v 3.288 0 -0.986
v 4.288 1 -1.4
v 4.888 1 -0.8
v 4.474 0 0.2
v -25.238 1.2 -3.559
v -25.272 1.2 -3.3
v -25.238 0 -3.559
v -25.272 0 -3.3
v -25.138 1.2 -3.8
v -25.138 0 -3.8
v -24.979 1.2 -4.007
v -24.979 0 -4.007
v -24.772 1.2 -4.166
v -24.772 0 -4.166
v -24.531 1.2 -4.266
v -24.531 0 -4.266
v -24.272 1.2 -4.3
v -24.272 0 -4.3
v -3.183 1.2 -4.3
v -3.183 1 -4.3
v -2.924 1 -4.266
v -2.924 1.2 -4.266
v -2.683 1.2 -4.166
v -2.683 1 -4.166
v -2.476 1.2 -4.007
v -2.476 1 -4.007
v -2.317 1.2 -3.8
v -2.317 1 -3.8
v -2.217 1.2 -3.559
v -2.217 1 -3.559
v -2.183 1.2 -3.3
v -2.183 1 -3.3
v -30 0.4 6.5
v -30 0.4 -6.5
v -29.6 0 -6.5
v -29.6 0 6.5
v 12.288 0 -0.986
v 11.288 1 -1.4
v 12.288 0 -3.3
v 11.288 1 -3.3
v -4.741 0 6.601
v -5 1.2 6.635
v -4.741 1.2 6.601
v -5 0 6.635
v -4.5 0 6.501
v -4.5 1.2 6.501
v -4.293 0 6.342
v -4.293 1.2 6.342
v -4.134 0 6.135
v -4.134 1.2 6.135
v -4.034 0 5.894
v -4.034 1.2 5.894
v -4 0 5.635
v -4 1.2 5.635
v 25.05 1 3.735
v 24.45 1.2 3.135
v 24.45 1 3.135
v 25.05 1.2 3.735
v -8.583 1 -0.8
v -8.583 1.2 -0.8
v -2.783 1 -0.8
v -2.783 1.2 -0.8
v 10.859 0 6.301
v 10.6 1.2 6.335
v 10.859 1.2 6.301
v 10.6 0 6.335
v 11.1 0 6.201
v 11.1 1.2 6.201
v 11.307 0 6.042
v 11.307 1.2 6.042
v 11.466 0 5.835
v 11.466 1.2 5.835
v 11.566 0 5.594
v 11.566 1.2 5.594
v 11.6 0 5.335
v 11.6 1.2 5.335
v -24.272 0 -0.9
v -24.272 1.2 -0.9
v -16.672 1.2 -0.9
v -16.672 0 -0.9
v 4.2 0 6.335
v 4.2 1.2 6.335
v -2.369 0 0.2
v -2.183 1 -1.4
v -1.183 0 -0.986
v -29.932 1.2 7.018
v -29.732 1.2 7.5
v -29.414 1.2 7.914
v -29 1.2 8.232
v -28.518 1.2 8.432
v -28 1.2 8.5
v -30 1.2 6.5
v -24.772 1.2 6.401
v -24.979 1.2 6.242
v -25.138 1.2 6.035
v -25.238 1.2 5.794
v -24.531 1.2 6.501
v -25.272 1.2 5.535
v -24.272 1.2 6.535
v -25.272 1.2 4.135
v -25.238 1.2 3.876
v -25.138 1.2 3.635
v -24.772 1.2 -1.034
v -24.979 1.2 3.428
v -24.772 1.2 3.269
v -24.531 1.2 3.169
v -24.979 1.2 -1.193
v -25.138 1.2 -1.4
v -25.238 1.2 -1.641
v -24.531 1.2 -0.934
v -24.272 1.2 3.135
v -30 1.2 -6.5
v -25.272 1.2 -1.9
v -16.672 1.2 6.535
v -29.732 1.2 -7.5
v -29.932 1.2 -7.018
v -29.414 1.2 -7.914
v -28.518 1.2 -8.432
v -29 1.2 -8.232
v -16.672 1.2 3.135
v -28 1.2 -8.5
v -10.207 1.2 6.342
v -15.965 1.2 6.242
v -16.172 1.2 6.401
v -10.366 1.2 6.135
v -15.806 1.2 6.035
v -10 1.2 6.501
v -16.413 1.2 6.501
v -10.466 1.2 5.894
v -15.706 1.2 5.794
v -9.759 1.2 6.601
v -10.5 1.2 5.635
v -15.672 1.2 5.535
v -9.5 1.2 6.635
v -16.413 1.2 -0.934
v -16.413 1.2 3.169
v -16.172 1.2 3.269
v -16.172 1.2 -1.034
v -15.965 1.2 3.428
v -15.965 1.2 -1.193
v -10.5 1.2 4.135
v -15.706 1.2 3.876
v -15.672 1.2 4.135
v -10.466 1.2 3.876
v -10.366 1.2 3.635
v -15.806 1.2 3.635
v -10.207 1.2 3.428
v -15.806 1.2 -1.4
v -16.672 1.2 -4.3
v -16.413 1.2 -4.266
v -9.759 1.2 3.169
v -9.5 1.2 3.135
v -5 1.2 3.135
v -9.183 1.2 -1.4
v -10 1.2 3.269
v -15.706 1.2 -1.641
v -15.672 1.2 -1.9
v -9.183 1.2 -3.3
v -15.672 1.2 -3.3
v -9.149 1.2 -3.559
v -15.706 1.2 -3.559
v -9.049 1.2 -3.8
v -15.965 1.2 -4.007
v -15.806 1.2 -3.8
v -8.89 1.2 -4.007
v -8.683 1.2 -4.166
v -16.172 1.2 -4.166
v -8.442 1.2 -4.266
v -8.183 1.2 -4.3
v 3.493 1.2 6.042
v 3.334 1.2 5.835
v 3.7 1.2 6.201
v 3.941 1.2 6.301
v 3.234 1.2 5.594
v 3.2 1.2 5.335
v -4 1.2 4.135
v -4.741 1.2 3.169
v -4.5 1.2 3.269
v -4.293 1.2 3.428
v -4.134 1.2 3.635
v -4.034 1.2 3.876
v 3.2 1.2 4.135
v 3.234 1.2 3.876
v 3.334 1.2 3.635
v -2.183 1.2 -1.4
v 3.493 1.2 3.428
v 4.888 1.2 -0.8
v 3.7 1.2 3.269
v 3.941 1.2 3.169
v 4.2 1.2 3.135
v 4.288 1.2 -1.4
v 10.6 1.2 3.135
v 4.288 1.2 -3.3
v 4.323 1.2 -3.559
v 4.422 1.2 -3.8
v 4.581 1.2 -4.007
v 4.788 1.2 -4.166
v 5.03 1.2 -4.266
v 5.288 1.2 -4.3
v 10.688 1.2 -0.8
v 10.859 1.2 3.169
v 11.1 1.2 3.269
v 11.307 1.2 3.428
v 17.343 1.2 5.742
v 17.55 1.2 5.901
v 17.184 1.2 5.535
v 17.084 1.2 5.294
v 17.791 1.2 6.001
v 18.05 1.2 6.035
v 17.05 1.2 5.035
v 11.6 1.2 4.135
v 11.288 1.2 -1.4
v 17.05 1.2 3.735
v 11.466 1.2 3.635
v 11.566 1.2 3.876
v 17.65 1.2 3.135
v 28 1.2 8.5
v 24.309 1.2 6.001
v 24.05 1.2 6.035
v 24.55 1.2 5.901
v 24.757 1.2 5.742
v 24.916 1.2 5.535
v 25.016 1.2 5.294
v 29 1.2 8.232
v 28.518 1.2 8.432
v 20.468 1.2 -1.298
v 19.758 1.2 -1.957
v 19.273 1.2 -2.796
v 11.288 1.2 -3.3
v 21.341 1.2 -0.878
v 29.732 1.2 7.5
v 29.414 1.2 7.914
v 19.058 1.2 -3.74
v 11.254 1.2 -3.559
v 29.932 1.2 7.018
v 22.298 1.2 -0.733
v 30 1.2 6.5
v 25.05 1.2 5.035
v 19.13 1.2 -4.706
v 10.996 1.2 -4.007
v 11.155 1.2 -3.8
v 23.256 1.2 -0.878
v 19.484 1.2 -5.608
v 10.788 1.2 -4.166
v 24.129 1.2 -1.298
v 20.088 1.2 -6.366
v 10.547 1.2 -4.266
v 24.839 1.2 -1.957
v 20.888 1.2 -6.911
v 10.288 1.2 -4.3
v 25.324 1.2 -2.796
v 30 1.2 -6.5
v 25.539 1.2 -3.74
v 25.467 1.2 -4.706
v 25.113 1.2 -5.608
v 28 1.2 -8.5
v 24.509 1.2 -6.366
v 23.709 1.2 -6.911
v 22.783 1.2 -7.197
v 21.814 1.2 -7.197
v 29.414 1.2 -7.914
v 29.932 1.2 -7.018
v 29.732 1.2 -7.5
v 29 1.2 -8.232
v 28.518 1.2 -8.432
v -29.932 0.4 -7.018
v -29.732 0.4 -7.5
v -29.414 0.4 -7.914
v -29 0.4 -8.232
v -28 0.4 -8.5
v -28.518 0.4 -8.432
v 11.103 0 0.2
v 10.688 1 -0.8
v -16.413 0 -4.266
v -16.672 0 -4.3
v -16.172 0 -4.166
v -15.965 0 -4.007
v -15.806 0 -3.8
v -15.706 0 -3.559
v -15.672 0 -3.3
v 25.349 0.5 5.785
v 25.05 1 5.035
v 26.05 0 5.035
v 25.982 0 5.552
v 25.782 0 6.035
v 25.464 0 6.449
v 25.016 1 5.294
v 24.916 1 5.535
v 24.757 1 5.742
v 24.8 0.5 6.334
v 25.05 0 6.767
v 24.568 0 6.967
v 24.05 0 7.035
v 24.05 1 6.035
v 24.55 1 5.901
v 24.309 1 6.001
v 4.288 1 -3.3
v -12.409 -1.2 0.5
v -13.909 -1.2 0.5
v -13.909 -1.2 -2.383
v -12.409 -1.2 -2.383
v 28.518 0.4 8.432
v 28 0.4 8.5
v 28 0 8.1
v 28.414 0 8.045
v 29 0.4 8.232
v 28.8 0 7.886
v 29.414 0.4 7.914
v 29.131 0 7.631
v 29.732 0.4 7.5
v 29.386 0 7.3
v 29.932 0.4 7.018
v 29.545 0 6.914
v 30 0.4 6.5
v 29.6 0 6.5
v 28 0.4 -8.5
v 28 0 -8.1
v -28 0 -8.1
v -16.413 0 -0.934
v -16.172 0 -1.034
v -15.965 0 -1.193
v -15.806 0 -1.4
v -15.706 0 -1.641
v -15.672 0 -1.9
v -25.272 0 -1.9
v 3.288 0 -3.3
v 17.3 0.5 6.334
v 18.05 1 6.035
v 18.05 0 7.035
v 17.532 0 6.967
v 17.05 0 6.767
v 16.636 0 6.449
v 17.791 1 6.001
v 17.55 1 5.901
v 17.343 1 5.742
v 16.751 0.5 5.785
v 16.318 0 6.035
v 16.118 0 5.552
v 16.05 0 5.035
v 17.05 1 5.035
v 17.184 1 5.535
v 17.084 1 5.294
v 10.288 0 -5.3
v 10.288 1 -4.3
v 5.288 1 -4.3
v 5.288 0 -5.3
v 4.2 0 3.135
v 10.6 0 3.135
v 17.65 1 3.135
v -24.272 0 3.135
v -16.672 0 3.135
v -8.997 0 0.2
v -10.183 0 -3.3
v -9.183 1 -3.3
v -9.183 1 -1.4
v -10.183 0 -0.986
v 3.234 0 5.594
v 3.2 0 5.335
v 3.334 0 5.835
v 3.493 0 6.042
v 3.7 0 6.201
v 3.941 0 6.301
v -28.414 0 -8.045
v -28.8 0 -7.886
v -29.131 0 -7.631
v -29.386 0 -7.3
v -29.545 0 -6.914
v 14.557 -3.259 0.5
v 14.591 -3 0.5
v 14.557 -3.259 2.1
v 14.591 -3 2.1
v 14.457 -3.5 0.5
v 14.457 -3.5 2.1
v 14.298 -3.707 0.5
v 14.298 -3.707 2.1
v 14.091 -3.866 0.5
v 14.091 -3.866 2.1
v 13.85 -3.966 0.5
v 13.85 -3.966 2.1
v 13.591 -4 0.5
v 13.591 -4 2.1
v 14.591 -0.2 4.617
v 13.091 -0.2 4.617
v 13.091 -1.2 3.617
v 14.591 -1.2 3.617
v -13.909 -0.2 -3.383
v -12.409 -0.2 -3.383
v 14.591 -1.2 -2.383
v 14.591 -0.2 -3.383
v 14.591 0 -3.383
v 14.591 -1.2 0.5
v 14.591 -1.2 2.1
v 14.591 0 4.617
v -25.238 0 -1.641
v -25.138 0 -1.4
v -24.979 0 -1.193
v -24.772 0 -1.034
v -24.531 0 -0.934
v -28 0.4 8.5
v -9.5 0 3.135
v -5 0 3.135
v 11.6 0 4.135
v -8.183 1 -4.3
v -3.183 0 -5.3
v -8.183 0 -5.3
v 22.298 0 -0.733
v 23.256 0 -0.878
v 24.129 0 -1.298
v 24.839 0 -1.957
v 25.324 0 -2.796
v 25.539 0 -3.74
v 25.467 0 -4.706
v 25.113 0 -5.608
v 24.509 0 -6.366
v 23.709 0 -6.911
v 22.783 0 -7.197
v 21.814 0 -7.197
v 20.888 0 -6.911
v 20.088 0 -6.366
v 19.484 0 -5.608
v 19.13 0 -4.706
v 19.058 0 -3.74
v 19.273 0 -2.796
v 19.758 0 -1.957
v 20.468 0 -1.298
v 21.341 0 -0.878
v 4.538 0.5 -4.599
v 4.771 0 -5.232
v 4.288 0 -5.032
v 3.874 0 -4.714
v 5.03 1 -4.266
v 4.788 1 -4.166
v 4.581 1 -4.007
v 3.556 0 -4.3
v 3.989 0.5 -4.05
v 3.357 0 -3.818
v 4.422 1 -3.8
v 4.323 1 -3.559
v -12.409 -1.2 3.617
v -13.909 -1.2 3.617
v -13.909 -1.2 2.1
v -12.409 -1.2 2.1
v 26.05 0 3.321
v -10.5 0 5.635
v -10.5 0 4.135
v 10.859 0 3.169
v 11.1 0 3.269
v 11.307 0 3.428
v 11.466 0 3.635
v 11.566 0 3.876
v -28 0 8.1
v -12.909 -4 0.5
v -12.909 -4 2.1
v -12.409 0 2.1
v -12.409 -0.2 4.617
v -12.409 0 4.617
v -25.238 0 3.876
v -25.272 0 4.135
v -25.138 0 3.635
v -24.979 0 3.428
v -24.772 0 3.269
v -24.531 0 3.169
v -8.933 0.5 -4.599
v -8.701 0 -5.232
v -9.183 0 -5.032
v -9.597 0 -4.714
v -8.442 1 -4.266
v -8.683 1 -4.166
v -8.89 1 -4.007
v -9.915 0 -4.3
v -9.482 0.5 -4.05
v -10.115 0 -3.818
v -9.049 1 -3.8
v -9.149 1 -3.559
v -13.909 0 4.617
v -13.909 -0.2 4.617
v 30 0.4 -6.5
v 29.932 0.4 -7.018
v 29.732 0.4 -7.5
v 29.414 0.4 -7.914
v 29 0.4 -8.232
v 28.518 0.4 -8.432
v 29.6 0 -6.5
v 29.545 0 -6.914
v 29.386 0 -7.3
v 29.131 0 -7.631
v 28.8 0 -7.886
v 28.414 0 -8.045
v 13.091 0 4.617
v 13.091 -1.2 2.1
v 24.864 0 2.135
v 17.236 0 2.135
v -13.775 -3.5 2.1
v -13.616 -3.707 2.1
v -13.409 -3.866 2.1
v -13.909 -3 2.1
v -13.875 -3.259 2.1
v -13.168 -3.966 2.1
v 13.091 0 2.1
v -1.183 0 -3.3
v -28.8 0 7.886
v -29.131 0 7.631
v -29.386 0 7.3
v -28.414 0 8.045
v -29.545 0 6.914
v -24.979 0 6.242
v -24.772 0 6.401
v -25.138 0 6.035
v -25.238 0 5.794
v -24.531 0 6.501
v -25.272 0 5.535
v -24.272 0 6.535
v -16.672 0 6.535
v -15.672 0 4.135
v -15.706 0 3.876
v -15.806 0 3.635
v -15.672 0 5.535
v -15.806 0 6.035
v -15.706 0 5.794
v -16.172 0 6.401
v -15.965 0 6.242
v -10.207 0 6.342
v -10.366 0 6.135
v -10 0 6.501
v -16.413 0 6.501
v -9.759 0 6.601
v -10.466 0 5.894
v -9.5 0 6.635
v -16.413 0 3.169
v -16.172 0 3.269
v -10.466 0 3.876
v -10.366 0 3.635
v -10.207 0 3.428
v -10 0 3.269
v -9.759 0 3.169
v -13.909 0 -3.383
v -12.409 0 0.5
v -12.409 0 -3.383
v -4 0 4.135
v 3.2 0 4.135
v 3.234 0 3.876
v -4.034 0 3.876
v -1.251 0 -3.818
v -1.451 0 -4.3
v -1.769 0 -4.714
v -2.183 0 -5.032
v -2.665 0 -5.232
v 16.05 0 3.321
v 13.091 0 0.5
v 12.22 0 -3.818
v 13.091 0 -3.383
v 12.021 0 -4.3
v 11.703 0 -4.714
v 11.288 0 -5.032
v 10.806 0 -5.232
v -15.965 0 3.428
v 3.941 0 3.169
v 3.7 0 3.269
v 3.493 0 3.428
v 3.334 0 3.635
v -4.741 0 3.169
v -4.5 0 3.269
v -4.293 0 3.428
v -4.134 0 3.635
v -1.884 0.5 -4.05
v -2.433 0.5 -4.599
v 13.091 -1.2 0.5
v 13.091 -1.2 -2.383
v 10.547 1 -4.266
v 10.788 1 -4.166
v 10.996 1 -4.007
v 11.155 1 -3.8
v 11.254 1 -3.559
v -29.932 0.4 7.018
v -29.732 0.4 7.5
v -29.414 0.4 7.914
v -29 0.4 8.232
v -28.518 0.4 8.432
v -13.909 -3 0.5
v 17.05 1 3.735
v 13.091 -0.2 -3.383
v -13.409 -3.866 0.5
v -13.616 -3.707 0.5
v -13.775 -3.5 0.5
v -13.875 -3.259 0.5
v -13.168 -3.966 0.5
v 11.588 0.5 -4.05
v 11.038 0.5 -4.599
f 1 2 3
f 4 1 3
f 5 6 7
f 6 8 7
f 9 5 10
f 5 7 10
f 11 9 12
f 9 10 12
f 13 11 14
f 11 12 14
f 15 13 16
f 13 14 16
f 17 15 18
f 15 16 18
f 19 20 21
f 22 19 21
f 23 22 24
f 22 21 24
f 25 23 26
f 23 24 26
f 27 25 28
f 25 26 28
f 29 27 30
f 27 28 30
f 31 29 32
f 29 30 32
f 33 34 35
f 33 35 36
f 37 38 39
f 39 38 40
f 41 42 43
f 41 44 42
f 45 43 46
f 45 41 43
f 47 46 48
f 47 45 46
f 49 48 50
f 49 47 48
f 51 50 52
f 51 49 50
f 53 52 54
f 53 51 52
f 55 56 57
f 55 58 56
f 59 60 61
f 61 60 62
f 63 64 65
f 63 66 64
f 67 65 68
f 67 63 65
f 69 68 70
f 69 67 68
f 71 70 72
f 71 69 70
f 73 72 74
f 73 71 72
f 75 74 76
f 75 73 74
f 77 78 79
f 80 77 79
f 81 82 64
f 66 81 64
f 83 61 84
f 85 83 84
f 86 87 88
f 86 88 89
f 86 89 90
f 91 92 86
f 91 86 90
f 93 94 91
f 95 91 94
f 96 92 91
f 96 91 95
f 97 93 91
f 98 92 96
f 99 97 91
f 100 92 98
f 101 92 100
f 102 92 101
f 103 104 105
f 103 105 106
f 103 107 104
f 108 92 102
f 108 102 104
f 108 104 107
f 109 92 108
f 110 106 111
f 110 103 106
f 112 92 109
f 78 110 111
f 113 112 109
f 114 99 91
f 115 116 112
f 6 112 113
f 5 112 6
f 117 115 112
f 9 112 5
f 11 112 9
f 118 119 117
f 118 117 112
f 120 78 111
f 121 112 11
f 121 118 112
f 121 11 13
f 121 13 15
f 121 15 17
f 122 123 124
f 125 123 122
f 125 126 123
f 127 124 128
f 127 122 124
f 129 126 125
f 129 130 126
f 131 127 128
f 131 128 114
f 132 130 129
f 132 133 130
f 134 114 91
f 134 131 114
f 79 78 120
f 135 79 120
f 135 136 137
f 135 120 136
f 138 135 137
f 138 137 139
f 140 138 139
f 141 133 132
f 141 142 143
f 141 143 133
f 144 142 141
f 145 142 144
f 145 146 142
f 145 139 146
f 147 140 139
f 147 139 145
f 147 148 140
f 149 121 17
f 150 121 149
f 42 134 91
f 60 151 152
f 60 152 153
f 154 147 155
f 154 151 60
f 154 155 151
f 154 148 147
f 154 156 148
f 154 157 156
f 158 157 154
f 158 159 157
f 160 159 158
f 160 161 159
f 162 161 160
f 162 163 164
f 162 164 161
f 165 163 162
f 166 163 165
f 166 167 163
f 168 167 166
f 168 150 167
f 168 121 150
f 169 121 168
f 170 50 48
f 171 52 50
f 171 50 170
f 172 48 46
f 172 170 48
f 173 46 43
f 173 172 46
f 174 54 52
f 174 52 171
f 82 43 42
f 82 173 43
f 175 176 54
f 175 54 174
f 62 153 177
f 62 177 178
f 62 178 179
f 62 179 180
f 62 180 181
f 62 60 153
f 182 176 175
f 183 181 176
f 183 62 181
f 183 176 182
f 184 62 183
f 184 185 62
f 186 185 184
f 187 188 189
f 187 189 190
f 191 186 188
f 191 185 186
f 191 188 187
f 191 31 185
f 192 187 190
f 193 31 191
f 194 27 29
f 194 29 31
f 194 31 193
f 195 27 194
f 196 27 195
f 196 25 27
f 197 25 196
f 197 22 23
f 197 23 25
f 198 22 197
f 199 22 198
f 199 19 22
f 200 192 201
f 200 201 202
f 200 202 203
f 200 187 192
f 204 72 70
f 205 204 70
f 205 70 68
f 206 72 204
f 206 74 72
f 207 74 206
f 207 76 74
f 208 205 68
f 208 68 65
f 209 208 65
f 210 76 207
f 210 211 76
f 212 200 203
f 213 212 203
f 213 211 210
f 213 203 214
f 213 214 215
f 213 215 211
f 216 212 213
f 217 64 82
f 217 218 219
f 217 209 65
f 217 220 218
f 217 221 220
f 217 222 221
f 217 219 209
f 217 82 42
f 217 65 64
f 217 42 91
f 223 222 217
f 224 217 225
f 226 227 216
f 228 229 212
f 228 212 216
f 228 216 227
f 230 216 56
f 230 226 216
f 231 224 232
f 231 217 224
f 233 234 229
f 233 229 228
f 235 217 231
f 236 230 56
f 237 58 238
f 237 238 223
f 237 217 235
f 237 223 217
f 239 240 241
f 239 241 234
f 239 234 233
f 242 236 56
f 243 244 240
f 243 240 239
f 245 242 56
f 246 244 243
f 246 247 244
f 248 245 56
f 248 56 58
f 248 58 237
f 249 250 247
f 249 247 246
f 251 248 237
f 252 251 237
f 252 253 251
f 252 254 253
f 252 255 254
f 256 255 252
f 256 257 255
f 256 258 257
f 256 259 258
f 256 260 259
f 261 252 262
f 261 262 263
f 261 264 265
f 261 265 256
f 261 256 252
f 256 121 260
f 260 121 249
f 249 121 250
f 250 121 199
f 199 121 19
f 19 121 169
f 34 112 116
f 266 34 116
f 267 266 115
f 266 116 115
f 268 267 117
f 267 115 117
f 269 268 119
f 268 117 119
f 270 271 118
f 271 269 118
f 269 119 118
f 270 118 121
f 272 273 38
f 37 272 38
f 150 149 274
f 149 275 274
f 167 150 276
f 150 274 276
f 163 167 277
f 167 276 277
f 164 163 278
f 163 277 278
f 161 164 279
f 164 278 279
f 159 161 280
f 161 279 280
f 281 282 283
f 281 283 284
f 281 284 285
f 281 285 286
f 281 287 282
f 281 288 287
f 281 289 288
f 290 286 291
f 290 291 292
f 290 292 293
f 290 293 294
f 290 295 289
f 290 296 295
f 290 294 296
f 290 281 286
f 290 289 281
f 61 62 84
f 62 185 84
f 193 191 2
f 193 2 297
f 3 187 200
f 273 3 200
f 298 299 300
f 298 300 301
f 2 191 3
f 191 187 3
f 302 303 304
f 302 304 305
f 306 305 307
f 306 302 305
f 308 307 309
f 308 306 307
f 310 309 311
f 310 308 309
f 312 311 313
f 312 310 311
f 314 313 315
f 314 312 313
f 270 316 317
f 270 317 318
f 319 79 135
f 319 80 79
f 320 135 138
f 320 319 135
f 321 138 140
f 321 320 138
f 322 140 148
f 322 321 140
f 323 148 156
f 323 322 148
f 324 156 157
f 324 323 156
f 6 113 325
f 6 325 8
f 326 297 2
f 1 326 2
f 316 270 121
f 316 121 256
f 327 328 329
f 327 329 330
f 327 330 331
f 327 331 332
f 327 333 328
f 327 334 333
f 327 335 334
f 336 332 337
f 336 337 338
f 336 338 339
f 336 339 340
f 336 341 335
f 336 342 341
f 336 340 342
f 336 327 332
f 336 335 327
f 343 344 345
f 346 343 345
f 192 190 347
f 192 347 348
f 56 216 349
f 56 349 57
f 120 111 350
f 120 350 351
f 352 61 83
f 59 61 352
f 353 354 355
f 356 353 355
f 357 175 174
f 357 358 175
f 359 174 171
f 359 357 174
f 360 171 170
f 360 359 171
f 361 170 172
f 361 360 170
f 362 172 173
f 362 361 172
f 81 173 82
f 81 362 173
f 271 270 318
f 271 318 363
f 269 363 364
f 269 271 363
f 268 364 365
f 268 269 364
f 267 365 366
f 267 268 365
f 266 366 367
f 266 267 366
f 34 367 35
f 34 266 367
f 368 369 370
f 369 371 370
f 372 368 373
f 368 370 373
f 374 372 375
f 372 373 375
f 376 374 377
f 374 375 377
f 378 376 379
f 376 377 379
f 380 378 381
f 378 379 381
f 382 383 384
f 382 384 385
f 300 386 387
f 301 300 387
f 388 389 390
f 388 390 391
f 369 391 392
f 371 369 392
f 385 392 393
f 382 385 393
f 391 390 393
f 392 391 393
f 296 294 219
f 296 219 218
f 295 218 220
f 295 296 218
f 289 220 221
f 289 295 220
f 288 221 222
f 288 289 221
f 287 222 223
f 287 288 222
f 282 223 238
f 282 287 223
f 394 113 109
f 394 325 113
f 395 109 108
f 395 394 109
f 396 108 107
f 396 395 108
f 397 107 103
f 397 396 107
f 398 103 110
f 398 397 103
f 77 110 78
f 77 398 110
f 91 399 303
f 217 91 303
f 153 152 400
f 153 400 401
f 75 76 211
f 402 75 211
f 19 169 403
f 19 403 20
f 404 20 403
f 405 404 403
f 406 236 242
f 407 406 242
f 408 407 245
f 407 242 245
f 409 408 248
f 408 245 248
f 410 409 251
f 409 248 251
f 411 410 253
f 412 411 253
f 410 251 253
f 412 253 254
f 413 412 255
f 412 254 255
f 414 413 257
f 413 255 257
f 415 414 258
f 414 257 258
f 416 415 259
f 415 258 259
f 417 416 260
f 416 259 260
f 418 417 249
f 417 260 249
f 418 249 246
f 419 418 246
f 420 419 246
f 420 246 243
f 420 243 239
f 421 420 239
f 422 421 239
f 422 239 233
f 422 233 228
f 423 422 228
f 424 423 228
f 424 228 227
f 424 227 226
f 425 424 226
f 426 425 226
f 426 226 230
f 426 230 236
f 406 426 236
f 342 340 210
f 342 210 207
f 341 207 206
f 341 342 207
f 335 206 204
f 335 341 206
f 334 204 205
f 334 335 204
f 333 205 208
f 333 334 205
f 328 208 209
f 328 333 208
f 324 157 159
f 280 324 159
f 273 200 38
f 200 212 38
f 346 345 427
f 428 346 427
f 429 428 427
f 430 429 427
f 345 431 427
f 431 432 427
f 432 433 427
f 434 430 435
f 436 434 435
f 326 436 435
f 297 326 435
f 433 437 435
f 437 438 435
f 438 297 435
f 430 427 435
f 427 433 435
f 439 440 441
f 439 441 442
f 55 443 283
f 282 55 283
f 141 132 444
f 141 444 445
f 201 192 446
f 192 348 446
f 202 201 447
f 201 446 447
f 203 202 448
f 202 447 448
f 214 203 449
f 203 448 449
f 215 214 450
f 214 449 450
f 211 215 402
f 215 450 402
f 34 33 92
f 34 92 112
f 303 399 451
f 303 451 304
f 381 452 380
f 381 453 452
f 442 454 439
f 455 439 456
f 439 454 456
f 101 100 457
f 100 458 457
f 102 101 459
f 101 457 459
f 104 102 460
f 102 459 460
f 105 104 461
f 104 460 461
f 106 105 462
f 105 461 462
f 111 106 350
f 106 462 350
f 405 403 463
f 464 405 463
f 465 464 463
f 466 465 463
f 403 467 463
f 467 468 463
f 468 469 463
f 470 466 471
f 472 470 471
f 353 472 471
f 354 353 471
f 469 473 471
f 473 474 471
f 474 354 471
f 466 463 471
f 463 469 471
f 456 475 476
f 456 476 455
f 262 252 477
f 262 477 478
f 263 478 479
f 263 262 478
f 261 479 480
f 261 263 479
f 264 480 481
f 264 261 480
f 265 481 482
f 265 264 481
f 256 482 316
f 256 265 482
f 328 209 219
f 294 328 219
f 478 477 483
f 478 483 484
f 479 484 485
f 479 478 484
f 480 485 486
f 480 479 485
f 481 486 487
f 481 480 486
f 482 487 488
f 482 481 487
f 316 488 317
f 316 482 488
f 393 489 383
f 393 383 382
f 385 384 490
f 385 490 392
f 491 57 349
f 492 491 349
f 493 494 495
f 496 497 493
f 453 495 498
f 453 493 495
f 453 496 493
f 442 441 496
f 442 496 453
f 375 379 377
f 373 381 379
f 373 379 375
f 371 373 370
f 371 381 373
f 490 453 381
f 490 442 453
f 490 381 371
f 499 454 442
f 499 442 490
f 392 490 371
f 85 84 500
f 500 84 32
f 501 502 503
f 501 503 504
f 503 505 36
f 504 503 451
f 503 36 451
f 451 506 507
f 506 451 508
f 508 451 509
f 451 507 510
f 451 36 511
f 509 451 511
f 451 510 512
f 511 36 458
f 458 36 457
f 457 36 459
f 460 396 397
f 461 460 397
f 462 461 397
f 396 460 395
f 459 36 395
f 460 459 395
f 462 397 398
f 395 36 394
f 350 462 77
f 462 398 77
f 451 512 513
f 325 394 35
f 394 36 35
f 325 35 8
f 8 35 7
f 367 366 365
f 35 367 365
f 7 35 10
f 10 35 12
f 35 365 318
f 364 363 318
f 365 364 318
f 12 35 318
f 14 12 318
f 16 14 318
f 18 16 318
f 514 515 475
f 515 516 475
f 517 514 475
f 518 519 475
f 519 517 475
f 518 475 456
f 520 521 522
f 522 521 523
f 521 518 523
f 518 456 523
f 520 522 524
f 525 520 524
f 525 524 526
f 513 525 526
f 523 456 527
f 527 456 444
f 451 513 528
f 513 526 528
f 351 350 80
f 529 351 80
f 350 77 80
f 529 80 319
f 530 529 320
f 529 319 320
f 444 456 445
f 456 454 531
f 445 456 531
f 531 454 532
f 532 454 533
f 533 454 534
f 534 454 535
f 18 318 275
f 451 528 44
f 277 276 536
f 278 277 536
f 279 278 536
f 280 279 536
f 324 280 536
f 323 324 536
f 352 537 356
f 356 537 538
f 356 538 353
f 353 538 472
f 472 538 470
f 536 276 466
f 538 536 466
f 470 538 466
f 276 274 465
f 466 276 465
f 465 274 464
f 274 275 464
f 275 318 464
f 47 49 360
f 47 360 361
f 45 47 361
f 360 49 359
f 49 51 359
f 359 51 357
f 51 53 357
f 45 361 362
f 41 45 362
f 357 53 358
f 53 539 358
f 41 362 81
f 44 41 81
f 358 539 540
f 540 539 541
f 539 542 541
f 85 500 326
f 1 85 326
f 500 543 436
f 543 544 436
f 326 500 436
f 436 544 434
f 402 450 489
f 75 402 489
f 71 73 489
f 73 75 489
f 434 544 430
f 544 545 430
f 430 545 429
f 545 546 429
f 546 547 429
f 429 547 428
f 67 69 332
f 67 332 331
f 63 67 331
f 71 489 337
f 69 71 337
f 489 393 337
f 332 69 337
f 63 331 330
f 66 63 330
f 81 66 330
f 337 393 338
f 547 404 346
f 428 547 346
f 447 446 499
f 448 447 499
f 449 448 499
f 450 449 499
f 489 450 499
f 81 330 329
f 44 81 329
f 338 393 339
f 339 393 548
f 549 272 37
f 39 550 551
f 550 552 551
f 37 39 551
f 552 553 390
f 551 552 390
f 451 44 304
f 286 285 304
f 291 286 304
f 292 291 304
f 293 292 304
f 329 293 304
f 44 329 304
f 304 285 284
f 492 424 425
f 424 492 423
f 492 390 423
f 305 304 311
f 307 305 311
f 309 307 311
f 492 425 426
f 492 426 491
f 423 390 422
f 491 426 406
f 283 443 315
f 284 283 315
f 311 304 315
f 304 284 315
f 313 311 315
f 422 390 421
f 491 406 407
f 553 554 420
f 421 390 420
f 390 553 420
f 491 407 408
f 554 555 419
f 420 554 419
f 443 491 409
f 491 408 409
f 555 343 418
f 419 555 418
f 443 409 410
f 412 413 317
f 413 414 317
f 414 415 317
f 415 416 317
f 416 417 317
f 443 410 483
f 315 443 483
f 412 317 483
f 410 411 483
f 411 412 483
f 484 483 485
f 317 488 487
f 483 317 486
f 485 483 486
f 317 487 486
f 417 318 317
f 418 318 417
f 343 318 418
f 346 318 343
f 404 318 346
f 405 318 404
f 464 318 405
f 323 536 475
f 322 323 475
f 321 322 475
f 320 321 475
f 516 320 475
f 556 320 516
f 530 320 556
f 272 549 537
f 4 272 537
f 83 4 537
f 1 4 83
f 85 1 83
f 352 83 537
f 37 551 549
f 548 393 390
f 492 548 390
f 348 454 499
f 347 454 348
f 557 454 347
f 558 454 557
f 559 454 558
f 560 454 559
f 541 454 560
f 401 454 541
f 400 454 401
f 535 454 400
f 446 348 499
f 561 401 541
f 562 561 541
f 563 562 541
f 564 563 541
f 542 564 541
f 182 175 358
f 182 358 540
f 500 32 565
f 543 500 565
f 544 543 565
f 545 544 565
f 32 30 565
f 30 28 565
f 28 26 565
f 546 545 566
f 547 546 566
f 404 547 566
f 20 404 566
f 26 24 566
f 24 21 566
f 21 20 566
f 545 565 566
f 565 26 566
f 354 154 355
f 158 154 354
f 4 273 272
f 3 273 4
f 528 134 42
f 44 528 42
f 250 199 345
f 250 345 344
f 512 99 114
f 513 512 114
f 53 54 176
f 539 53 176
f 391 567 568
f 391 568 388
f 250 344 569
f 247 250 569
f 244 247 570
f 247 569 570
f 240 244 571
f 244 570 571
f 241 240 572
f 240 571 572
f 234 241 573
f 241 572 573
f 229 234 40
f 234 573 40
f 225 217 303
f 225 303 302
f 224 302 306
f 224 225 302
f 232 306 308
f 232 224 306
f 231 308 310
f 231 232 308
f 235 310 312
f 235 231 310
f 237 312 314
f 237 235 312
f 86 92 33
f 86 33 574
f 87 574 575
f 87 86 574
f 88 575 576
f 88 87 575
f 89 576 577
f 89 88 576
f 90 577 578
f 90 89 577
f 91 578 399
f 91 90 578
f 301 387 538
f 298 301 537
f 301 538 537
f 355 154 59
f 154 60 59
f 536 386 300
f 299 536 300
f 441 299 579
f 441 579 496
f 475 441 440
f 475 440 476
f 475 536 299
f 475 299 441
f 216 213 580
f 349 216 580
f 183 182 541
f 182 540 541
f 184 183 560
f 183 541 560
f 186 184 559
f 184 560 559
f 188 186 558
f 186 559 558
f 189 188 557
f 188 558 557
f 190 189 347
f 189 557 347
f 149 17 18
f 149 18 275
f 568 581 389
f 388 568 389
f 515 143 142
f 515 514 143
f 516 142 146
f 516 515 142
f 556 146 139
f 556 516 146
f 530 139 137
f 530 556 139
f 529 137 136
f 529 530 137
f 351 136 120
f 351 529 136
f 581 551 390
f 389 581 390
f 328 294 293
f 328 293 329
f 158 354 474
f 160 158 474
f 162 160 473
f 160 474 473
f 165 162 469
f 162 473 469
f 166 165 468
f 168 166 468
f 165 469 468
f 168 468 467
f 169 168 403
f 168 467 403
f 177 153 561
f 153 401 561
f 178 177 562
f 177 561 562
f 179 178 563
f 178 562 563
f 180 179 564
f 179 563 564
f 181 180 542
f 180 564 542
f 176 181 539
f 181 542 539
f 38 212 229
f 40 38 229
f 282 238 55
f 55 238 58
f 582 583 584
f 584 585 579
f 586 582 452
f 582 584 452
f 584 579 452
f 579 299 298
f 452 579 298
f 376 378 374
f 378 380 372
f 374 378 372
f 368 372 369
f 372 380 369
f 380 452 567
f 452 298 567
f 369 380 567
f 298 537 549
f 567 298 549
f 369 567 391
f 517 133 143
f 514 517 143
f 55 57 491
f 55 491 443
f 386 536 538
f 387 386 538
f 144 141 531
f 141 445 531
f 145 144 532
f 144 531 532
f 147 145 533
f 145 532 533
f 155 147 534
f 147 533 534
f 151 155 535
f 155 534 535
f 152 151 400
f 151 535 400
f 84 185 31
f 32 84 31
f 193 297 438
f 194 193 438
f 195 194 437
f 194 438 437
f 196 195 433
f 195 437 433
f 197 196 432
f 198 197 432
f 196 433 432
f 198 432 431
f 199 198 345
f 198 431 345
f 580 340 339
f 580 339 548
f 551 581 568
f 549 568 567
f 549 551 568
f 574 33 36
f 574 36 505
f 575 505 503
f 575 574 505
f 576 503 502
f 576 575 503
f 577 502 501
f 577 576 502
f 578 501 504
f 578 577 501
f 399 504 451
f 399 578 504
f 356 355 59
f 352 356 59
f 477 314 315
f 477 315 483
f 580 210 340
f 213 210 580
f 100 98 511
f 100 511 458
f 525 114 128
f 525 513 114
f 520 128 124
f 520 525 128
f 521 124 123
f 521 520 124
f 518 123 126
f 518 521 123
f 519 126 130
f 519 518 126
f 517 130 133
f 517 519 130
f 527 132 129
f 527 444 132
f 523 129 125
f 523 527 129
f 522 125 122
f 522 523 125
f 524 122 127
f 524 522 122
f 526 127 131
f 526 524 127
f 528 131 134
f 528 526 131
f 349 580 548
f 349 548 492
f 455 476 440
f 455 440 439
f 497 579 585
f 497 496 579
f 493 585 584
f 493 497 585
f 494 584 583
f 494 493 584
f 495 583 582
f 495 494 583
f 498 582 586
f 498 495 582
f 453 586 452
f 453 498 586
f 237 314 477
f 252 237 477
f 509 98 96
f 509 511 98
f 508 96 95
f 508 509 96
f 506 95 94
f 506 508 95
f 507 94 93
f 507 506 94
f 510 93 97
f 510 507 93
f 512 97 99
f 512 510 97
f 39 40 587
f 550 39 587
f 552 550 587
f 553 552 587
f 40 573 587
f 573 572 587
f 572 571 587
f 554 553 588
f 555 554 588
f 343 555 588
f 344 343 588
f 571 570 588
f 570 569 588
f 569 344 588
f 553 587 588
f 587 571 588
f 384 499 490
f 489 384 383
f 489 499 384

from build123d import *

# Parameters (mm, degrees)
SKETCH_1_W          = 60
SKETCH_1_H          = 17
EXTRUDE_1_DEPTH     = 1.2
CUT_EXTRUDE_1_REACH = 33.204
SKETCH_4_R          = 3.25
SKETCH_4_W          = 9.6
SKETCH_4_H          = 3.4
SKETCH_4_W_2        = 7
SKETCH_4_H_2        = 3.5
SKETCH_4_W_3        = 8
SKETCH_4_H_3        = 2.9
SKETCH_4_W_4        = 8.4
SKETCH_4_H_4        = 3.2
SKETCH_4_W_5        = 6.5
FILLET_2_R          = 1
CHAMFER_1_SIZE      = 0.6
SKETCH_5_W          = 1.5
SKETCH_5_H          = 8
EXTRUDE_2_DEPTH     = 1.2
SKETCH_6_W          = 28.5
SKETCH_6_H          = 1.6
EXTRUDE_3_DEPTH     = 4
FILLET_3_R          = 1
CHAMFER_2_SIZE      = 1
CHAMFER_4_SIZE      = 1
FILLET_4_R          = 2
CHAMFER_5_SIZE      = 0.4


with BuildPart() as part:
    # 草图1 → 凸台-拉伸1 (new body)
    with BuildSketch(Plane(origin=(0, 0, 0), x_dir=(1, 0, 0), z_dir=(0, 1, 0))):
        Rectangle(SKETCH_1_W, SKETCH_1_H)
    extrude(amount=EXTRUDE_1_DEPTH)

    # 草图4 → 切除-拉伸1 (cut, up to next)
    with BuildSketch(Plane(origin=(0, 1.2, 0), x_dir=(1, 0, 0), z_dir=(0, 1, 0)), mode=Mode.PRIVATE) as cut_extrude_1_sk1:
        with Locations(Location((22.298485985, 3.98318929, 0), (0, 0, 270))):
            Circle(SKETCH_4_R)
    cut_extrude_1_tool1 = extrude(cut_extrude_1_sk1.sketch, amount=-CUT_EXTRUDE_1_REACH, mode=Mode.PRIVATE) & part.part
    # 草图4 → 切除-拉伸1 (cut, up to next)
    with BuildSketch(Plane(origin=(0, 1.2, 0), x_dir=(1, 0, 0), z_dir=(0, 1, 0)), mode=Mode.PRIVATE) as cut_extrude_1_sk2:
        with Locations((-20.471722325, 2.6)):
            Rectangle(SKETCH_4_W, SKETCH_4_H)
    cut_extrude_1_tool2 = extrude(cut_extrude_1_sk2.sketch, amount=-CUT_EXTRUDE_1_REACH, mode=Mode.PRIVATE) & part.part
    # 草图4 → 切除-拉伸1 (cut, up to next)
    with BuildSketch(Plane(origin=(0, 1.2, 0), x_dir=(1, 0, 0), z_dir=(0, 1, 0)), mode=Mode.PRIVATE) as cut_extrude_1_sk3:
        with Locations((-5.682926277, 2.55)):
            Rectangle(SKETCH_4_W_2, SKETCH_4_H_2)
    cut_extrude_1_tool3 = extrude(cut_extrude_1_sk3.sketch, amount=-CUT_EXTRUDE_1_REACH, mode=Mode.PRIVATE) & part.part
    # 草图4 → 切除-拉伸1 (cut, up to next)
    with BuildSketch(Plane(origin=(0, 1.2, 0), x_dir=(1, 0, 0), z_dir=(0, 1, 0)), mode=Mode.PRIVATE) as cut_extrude_1_sk4:
        with Locations((7.788485985, 2.55)):
            Rectangle(SKETCH_4_W_2, SKETCH_4_H_2)
    cut_extrude_1_tool4 = extrude(cut_extrude_1_sk4.sketch, amount=-CUT_EXTRUDE_1_REACH, mode=Mode.PRIVATE) & part.part
    # 草图4 → 切除-拉伸1 (cut, up to next)
    with BuildSketch(Plane(origin=(0, 1.2, 0), x_dir=(1, 0, 0), z_dir=(0, 1, 0)), mode=Mode.PRIVATE) as cut_extrude_1_sk5:
        with Locations((21.05, -4.584803861)):
            Rectangle(SKETCH_4_W_3, SKETCH_4_H_3)
    cut_extrude_1_tool5 = extrude(cut_extrude_1_sk5.sketch, amount=-CUT_EXTRUDE_1_REACH, mode=Mode.PRIVATE) & part.part
    # 草图4 → 切除-拉伸1 (cut, up to next)
    with BuildSketch(Plane(origin=(0, 1.2, 0), x_dir=(1, 0, 0), z_dir=(0, 1, 0)), mode=Mode.PRIVATE) as cut_extrude_1_sk6:
        with Locations((7.4, -4.734803861)):
            Rectangle(SKETCH_4_W_4, SKETCH_4_H_4)
    cut_extrude_1_tool6 = extrude(cut_extrude_1_sk6.sketch, amount=-CUT_EXTRUDE_1_REACH, mode=Mode.PRIVATE) & part.part
    # 草图4 → 切除-拉伸1 (cut, up to next)
    with BuildSketch(Plane(origin=(0, 1.2, 0), x_dir=(1, 0, 0), z_dir=(0, 1, 0)), mode=Mode.PRIVATE) as cut_extrude_1_sk7:
        with Locations((-7.25, -4.884803861)):
            Rectangle(SKETCH_4_W_5, SKETCH_4_H_2)
    cut_extrude_1_tool7 = extrude(cut_extrude_1_sk7.sketch, amount=-CUT_EXTRUDE_1_REACH, mode=Mode.PRIVATE) & part.part
    # 草图4 → 切除-拉伸1 (cut, up to next)
    with BuildSketch(Plane(origin=(0, 1.2, 0), x_dir=(1, 0, 0), z_dir=(0, 1, 0)), mode=Mode.PRIVATE) as cut_extrude_1_sk8:
        with Locations((-20.471722325, -4.834803861)):
            Rectangle(SKETCH_4_W, SKETCH_4_H)
    cut_extrude_1_tool8 = extrude(cut_extrude_1_sk8.sketch, amount=-CUT_EXTRUDE_1_REACH, mode=Mode.PRIVATE) & part.part
    add(cut_extrude_1_tool1.solids().sort_by_distance((22.298486, 1.2, -3.983189))[0], mode=Mode.SUBTRACT)
    add(cut_extrude_1_tool2.solids().sort_by_distance((-20.471722, 1.2, -2.6))[0], mode=Mode.SUBTRACT)
    add(cut_extrude_1_tool3.solids().sort_by_distance((-5.682926, 1.2, -2.55))[0], mode=Mode.SUBTRACT)
    add(cut_extrude_1_tool4.solids().sort_by_distance((7.788486, 1.2, -2.55))[0], mode=Mode.SUBTRACT)
    add(cut_extrude_1_tool5.solids().sort_by_distance((21.05, 1.2, 4.584804))[0], mode=Mode.SUBTRACT)
    add(cut_extrude_1_tool6.solids().sort_by_distance((7.4, 1.2, 4.734804))[0], mode=Mode.SUBTRACT)
    add(cut_extrude_1_tool7.solids().sort_by_distance((-7.25, 1.2, 4.884804))[0], mode=Mode.SUBTRACT)
    add(cut_extrude_1_tool8.solids().sort_by_distance((-20.471722, 1.2, 4.834804))[0], mode=Mode.SUBTRACT)

    # 圆角2
    fillet_2_edges = [part.edges().sort_by_distance(p)[0] for p in [
        (-9.182926277, 0.6, -4.3),
        (-2.182926277, 0.6, -4.3),
        (4.288485985, 0.6, -4.3),
        (11.288485985, 0.6, -4.3),
        (17.05, 0.6, 6.034803861),
        (25.05, 0.6, 6.034803861),
        (3.2, 0.6, 6.334803861),
        (3.2, 0.6, 3.134803861),
        (11.6, 0.6, 3.134803861),
        (11.6, 0.6, 6.334803861),
        (-10.5, 0.6, 6.634803861),
        (-10.5, 0.6, 3.134803861),
        (-4, 0.6, 3.134803861),
        (-4, 0.6, 6.634803861),
        (-25.271722325, 0.6, 6.534803861),
        (-25.271722325, 0.6, 3.134803861),
        (-15.671722325, 0.6, 3.134803861),
        (-15.671722325, 0.6, 6.534803861),
        (-25.271722325, 0.6, -0.9),
        (-25.271722325, 0.6, -4.3),
        (-15.671722325, 0.6, -4.3),
        (-15.671722325, 0.6, -0.9),
    ]]
    fillet(fillet_2_edges, radius=FILLET_2_R)

    # 倒角1
    chamfer_1_edges = [part.edges().sort_by_distance(p)[0] for p in [
        (-9.182926277, 0.6, -0.8),
        (-2.182926277, 0.6, -0.8),
        (4.288485985, 0.6, -0.8),
        (11.288485985, 0.6, -0.8),
        (17.05, 0.6, 3.134803861),
        (25.05, 0.6, 3.134803861),
    ]]
    chamfer(chamfer_1_edges, length=CHAMFER_1_SIZE)

    # 草图5 → 凸台-拉伸2 (add)
    with BuildSketch(Plane.XZ):
        with Locations((-13.15891381, 0.61681071)):
            Rectangle(SKETCH_5_W, SKETCH_5_H)
        with Locations((13.84108619, 0.61681071)):
            Rectangle(SKETCH_5_W, SKETCH_5_H)
    extrude(amount=EXTRUDE_2_DEPTH)

    # 草图6 → 凸台-拉伸3 (add)
    with BuildSketch(Plane.XZ):
        with Locations((0.34108619, 1.3)):
            Rectangle(SKETCH_6_W, SKETCH_6_H)
    extrude(amount=EXTRUDE_3_DEPTH)

    # 圆角3
    fillet_3_edges = [part.edges().sort_by_distance(p)[0] for p in [
        (-13.90891381, -4, 1.3),
        (14.59108619, -4, 1.3),
    ]]
    fillet(fillet_3_edges, radius=FILLET_3_R)

    # 倒角2
    chamfer_2_edges = [part.edges().sort_by_distance(p)[0] for p in [
        (-13.15891381, -1.2, -3.38318929),
        (-13.15891381, -1.2, 4.61681071),
        (13.84108619, -1.2, -3.38318929),
        (13.84108619, -1.2, 4.61681071),
    ]]
    chamfer(chamfer_2_edges, length=CHAMFER_2_SIZE)

    # 倒角4
    chamfer_4_edges = [part.edges().sort_by_distance(p)[0] for p in [
        (-5.682926277, 0, -4.3),
        (-2.182926277, 0, -2.35),
        (7.788485985, 0, -4.3),
        (11.288485985, 0, -2.35),
        (21.05, 0, 6.034803861),
        (17.05, 0, 4.384803861),
        (-2.475819496, 0, -4.007106781),
        (-8.890033058, 0, -4.007106781),
        (4.581379204, 0, -4.007106781),
        (10.995592766, 0, -4.007106781),
        (24.757106781, 0, 5.741910642),
        (17.342893219, 0, 5.741910642),
        (-5.682926277, 0, -0.8),
        (-9.182926277, 0, -2.35),
        (7.788485985, 0, -0.8),
        (4.288485985, 0, -2.35),
        (21.05, 0, 3.134803861),
        (25.05, 0, 4.384803861),
        (-8.882926277, 0, -1.1),
        (-2.482926277, 0, -1.1),
        (4.588485985, 0, -1.1),
        (10.988485985, 0, -1.1),
        (17.35, 0, 3.434803861),
        (24.75, 0, 3.434803861),
    ]]
    chamfer(chamfer_4_edges, length=CHAMFER_4_SIZE)

    # 圆角4
    fillet_4_edges = [part.edges().sort_by_distance(p)[0] for p in [
        (30, 0.6, 8.5),
        (-30, 0.6, 8.5),
        (-30, 0.6, -8.5),
        (30, 0.6, -8.5),
    ]]
    fillet(fillet_4_edges, radius=FILLET_4_R)

    # 倒角5
    chamfer_5_edges = [part.edges().sort_by_distance(p)[0] for p in [
        (30, 0, 0),
        (0, 0, 8.5),
        (-30, 0, 0),
        (0, 0, -8.5),
        (-29.414213562, 0, -7.914213562),
        (-29.414213562, 0, 7.914213562),
        (29.414213562, 0, -7.914213562),
        (29.414213562, 0, 7.914213562),
    ]]
    chamfer(chamfer_5_edges, length=CHAMFER_5_SIZE)


solid = part.part
